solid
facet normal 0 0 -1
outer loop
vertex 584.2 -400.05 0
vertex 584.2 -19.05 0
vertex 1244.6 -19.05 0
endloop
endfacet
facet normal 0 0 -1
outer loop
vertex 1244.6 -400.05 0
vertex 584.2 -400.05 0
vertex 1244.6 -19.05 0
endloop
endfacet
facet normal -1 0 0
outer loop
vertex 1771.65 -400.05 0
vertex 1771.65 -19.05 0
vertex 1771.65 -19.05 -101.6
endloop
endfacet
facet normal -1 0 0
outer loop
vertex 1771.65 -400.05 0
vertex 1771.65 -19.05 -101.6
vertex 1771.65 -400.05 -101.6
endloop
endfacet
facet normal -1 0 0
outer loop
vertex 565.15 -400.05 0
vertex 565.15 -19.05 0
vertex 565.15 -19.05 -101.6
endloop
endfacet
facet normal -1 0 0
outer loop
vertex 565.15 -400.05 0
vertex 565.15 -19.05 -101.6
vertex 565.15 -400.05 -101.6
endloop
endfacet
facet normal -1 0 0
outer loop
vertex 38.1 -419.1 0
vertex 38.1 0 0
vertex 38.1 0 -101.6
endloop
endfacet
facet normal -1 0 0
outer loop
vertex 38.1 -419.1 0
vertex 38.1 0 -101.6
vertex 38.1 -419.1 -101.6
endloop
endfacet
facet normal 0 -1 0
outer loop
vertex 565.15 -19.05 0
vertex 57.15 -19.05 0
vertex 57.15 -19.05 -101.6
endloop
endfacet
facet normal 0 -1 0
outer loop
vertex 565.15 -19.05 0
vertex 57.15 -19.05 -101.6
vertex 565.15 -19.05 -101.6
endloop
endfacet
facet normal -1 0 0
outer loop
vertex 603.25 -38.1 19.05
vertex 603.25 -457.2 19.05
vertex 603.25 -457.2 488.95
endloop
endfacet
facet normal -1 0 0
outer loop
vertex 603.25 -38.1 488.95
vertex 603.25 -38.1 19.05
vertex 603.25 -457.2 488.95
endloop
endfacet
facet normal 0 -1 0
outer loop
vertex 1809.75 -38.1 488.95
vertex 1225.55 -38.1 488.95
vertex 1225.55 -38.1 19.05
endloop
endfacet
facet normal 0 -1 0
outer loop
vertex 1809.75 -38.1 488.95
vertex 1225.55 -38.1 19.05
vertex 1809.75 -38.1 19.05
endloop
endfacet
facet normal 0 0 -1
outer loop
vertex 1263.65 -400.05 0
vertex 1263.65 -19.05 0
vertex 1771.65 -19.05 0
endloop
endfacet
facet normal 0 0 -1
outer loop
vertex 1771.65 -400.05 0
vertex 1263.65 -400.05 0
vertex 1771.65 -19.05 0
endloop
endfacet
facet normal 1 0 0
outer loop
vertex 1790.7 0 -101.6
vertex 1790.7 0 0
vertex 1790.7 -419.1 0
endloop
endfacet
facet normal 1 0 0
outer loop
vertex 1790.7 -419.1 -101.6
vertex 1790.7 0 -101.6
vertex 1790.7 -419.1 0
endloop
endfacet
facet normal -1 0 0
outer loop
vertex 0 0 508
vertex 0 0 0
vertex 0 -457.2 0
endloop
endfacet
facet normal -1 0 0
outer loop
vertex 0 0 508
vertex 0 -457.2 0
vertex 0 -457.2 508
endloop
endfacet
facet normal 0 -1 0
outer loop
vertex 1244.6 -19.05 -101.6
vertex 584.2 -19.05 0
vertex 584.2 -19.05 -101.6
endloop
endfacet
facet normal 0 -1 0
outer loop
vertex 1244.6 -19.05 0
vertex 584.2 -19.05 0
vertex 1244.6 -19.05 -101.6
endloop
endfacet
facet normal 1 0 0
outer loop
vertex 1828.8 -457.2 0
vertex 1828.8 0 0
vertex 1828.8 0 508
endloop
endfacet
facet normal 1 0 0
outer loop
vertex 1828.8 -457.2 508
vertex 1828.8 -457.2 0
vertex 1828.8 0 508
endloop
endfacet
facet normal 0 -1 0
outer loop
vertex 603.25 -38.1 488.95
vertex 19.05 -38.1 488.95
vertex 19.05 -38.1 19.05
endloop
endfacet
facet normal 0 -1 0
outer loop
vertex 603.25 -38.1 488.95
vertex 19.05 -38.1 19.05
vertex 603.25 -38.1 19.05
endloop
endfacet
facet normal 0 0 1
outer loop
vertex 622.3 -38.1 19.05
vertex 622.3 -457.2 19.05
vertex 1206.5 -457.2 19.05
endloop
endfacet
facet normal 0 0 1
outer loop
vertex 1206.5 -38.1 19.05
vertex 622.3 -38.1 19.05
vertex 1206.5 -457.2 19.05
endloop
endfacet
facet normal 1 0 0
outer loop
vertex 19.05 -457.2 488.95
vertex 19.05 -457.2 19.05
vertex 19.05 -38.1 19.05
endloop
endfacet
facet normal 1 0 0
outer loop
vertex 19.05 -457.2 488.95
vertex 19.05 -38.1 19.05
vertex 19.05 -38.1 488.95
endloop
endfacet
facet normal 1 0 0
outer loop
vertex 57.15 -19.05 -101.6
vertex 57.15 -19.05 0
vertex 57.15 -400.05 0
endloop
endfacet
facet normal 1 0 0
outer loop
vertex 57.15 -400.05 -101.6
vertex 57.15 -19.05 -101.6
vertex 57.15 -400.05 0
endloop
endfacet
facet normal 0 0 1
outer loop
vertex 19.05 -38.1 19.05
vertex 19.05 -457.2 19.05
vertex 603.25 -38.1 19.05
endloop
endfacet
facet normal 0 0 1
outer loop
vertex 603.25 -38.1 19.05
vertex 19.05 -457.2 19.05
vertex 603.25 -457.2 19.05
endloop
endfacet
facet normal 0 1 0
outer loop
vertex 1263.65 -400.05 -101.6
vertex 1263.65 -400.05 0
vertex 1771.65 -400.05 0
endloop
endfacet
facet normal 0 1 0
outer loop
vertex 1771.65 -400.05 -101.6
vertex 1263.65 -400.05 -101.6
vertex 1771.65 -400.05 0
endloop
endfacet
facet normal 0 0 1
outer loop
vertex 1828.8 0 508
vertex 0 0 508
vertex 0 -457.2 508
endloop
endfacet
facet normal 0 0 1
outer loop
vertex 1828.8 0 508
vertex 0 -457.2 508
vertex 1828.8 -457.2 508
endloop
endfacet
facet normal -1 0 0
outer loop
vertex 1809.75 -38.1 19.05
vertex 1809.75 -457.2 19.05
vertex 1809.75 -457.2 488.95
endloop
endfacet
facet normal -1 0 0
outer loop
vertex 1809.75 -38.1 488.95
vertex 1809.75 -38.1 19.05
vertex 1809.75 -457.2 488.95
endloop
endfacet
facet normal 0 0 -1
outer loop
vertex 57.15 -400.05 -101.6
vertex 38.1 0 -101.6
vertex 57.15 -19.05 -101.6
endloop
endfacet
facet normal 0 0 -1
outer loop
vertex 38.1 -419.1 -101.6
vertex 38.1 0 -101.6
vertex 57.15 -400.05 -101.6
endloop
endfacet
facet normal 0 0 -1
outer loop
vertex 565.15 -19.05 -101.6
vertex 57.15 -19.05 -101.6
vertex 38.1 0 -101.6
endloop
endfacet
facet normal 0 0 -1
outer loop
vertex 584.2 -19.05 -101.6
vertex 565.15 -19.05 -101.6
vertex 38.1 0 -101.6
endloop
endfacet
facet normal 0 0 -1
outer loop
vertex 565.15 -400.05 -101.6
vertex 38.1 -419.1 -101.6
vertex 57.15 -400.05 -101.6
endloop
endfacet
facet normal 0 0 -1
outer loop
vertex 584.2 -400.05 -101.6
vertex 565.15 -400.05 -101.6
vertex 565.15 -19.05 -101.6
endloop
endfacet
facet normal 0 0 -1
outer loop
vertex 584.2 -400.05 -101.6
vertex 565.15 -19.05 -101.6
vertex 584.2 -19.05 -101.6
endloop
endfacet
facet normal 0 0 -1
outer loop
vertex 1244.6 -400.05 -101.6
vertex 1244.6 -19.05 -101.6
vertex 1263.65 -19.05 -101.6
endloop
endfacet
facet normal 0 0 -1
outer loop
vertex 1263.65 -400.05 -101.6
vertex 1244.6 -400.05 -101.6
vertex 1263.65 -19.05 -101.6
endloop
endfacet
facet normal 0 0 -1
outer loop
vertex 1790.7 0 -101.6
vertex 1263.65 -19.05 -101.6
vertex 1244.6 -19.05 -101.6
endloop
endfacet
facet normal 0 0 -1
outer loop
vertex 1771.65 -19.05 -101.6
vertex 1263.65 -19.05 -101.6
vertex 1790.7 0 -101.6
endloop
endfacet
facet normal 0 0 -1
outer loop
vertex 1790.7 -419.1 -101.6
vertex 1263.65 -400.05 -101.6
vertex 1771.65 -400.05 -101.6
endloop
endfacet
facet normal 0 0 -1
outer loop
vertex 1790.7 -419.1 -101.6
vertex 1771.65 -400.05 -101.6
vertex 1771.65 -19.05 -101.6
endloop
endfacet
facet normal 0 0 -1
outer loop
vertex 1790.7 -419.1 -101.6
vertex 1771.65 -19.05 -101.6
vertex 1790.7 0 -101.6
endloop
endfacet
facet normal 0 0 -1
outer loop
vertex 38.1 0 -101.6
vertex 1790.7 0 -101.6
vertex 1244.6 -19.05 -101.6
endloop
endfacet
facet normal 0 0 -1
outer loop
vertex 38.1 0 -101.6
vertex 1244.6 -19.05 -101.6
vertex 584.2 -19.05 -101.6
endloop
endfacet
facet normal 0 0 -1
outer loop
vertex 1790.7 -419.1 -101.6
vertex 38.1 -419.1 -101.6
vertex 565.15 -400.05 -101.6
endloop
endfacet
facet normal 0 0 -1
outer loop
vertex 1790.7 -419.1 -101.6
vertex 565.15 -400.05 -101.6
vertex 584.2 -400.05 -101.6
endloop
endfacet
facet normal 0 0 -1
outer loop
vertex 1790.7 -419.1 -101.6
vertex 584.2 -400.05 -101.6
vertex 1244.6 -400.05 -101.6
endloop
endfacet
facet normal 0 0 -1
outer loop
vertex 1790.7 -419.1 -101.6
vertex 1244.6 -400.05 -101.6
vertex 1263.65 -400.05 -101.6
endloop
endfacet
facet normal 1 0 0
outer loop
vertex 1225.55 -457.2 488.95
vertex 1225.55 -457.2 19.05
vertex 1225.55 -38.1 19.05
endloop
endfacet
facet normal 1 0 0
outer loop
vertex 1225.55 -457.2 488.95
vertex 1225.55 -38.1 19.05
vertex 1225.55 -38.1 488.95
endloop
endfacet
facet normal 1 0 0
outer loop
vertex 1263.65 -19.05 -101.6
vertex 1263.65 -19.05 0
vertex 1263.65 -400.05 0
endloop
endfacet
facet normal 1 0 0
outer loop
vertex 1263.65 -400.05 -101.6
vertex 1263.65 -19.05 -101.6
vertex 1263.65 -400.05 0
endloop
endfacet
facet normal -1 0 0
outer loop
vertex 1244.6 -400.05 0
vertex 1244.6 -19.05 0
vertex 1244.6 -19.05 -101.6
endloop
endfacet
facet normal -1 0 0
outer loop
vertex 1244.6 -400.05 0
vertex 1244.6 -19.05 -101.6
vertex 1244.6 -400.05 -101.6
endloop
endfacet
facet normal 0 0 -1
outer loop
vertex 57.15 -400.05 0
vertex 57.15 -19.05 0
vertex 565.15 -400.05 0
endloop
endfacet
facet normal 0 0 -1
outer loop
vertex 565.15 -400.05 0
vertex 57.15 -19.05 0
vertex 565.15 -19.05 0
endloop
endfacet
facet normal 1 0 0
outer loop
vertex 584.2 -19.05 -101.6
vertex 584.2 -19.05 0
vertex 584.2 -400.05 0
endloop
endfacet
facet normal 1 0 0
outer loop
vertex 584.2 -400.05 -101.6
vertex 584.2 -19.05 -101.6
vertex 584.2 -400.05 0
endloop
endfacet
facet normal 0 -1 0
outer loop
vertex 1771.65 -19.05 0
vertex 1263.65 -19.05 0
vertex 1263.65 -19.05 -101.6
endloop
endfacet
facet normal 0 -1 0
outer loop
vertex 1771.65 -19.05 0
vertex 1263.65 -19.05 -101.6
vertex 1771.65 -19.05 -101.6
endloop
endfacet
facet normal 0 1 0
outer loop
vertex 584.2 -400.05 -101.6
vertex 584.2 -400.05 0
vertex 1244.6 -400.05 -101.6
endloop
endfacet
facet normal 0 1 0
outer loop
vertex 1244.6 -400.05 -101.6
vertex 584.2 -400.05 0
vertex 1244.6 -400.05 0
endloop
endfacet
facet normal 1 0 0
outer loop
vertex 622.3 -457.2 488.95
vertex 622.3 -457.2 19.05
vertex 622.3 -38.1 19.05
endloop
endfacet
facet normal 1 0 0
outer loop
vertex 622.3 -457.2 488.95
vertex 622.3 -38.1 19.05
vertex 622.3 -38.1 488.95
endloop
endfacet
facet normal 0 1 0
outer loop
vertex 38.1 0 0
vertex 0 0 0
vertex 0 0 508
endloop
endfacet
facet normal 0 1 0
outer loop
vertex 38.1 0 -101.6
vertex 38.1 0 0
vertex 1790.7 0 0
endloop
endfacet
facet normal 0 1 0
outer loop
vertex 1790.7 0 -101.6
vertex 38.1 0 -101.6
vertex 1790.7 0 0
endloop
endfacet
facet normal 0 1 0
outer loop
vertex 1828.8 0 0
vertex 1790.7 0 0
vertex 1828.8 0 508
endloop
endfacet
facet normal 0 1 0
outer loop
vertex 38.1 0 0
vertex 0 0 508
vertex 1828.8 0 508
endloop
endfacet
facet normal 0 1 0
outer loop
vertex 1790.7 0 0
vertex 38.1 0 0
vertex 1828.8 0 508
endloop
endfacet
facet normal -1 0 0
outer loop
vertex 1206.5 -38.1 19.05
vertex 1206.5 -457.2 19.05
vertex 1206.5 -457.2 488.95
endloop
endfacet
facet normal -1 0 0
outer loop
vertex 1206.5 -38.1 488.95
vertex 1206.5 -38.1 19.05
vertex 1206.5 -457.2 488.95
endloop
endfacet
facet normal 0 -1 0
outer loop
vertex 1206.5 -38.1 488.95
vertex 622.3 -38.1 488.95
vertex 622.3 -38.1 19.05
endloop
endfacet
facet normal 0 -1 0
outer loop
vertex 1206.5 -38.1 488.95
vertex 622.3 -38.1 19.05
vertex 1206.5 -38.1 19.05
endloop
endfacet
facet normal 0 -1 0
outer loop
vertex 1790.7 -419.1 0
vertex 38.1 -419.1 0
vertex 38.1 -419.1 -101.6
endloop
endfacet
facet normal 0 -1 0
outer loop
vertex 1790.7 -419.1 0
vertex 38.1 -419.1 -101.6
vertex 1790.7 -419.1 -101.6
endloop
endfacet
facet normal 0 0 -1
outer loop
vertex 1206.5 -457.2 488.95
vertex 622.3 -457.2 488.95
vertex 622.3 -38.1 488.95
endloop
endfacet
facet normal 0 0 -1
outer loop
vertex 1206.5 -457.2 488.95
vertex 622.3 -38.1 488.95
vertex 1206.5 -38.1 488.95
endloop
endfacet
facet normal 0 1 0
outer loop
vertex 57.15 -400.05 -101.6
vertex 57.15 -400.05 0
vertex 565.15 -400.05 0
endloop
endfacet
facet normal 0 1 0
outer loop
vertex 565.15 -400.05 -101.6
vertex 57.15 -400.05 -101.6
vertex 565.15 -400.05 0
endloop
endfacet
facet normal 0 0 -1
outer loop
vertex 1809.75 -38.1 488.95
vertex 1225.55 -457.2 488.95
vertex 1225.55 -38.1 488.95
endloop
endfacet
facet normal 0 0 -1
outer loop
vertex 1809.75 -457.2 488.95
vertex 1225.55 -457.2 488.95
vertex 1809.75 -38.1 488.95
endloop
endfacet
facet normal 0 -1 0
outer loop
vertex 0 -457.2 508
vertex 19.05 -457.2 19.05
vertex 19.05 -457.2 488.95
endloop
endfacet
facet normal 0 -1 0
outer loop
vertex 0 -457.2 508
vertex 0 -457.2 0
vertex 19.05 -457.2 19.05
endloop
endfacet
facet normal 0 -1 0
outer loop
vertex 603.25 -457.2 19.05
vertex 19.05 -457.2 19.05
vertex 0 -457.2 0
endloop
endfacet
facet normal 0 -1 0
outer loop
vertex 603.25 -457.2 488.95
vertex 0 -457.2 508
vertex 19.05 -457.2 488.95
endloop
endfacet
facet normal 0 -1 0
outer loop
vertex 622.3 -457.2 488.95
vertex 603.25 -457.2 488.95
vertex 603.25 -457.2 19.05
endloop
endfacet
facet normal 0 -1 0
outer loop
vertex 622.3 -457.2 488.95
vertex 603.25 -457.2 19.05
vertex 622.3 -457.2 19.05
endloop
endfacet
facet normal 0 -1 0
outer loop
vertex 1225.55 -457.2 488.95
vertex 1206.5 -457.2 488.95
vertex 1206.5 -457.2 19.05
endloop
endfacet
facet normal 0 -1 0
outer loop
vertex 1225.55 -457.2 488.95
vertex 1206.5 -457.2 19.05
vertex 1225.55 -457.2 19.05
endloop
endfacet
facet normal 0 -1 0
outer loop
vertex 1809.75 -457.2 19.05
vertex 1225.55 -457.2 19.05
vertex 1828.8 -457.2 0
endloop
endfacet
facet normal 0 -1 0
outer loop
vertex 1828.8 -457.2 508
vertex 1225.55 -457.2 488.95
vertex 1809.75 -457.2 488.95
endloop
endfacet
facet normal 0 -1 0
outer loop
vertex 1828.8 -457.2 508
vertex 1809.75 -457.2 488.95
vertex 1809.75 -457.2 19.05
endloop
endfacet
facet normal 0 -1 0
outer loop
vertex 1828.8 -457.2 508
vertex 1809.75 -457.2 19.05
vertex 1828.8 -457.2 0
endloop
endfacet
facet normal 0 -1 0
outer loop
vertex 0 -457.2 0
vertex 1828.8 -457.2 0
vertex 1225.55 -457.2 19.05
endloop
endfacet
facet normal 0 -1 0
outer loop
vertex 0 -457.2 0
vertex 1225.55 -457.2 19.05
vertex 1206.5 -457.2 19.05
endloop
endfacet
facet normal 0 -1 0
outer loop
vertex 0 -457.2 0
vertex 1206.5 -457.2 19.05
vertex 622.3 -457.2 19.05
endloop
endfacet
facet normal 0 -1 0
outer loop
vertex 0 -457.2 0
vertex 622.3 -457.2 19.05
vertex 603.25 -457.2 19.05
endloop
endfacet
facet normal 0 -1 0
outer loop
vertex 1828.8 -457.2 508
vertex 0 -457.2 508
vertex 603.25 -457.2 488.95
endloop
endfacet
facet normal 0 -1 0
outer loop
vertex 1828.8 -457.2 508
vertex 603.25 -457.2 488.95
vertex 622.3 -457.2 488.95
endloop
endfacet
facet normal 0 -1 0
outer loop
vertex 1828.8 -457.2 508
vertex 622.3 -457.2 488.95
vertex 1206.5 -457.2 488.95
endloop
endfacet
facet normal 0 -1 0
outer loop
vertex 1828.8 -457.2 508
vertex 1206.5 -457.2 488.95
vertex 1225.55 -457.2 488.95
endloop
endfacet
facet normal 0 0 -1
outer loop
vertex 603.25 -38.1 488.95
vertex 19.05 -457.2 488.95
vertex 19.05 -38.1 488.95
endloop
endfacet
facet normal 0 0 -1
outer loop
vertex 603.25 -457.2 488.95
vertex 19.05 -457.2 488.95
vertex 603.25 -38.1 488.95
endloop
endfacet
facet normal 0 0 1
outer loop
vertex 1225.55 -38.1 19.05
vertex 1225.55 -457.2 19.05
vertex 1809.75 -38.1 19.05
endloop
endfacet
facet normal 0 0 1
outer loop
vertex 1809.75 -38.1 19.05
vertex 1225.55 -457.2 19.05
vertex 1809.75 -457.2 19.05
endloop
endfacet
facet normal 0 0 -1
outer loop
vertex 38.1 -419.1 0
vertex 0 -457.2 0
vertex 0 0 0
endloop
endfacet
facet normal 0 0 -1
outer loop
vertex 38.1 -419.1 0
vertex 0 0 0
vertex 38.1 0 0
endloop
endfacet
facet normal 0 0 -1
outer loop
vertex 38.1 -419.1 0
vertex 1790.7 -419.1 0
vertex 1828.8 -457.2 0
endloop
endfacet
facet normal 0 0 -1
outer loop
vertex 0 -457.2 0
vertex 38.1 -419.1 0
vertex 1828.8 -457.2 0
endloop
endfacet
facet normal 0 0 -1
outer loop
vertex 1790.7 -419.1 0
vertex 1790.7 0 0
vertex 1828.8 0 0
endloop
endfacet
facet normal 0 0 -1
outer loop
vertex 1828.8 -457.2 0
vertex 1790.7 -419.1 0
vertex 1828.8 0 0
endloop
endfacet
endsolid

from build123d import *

# Parameters (mm, degrees)
F0_W     = 1828.8
F0_H     = 508
F1_DEPTH = 457.2
F2_W     = 584.2
F2_H     = 469.9
F3_DEPTH = 419.1
F4_W     = 1752.6
F4_H     = 419.1
F4_W_2   = 508
F4_H_2   = 381
F4_W_3   = 660.4
F5_DEPTH = 101.6


with BuildPart() as f1:
    # F0 (on Front) → F1 (new body)
    with BuildSketch(Plane.XZ):
        with Locations((914.4, 254)):
            Rectangle(F0_W, F0_H)
    extrude(amount=F1_DEPTH)

    # F2 (on face) → F3 (cut)
    with BuildSketch(Plane.XZ.offset(457.2)):
        with Locations((311.15, 254)):
            Rectangle(F2_W, F2_H)
        with Locations((914.4, 254)):
            Rectangle(F2_W, F2_H)
        with Locations((1517.65, 254)):
            Rectangle(F2_W, F2_H)
    extrude(amount=-F3_DEPTH, mode=Mode.SUBTRACT)

    # F4 (on face) → F5 (join)
    with BuildSketch(Plane(origin=(0, 0, 0), x_dir=(1, 0, 0), z_dir=(0, 0, -1))):
        with Locations((914.4, 209.55)):
            Rectangle(F4_W, F4_H)
        with Locations((311.15, 209.55)):
            Rectangle(F4_W_2, F4_H_2, mode=Mode.SUBTRACT)
        with Locations((914.4, 209.55)):
            Rectangle(F4_W_3, F4_H_2, mode=Mode.SUBTRACT)
        with Locations((1517.65, 209.55)):
            Rectangle(F4_W_2, F4_H_2, mode=Mode.SUBTRACT)
    extrude(amount=F5_DEPTH)


solid = f1.part
